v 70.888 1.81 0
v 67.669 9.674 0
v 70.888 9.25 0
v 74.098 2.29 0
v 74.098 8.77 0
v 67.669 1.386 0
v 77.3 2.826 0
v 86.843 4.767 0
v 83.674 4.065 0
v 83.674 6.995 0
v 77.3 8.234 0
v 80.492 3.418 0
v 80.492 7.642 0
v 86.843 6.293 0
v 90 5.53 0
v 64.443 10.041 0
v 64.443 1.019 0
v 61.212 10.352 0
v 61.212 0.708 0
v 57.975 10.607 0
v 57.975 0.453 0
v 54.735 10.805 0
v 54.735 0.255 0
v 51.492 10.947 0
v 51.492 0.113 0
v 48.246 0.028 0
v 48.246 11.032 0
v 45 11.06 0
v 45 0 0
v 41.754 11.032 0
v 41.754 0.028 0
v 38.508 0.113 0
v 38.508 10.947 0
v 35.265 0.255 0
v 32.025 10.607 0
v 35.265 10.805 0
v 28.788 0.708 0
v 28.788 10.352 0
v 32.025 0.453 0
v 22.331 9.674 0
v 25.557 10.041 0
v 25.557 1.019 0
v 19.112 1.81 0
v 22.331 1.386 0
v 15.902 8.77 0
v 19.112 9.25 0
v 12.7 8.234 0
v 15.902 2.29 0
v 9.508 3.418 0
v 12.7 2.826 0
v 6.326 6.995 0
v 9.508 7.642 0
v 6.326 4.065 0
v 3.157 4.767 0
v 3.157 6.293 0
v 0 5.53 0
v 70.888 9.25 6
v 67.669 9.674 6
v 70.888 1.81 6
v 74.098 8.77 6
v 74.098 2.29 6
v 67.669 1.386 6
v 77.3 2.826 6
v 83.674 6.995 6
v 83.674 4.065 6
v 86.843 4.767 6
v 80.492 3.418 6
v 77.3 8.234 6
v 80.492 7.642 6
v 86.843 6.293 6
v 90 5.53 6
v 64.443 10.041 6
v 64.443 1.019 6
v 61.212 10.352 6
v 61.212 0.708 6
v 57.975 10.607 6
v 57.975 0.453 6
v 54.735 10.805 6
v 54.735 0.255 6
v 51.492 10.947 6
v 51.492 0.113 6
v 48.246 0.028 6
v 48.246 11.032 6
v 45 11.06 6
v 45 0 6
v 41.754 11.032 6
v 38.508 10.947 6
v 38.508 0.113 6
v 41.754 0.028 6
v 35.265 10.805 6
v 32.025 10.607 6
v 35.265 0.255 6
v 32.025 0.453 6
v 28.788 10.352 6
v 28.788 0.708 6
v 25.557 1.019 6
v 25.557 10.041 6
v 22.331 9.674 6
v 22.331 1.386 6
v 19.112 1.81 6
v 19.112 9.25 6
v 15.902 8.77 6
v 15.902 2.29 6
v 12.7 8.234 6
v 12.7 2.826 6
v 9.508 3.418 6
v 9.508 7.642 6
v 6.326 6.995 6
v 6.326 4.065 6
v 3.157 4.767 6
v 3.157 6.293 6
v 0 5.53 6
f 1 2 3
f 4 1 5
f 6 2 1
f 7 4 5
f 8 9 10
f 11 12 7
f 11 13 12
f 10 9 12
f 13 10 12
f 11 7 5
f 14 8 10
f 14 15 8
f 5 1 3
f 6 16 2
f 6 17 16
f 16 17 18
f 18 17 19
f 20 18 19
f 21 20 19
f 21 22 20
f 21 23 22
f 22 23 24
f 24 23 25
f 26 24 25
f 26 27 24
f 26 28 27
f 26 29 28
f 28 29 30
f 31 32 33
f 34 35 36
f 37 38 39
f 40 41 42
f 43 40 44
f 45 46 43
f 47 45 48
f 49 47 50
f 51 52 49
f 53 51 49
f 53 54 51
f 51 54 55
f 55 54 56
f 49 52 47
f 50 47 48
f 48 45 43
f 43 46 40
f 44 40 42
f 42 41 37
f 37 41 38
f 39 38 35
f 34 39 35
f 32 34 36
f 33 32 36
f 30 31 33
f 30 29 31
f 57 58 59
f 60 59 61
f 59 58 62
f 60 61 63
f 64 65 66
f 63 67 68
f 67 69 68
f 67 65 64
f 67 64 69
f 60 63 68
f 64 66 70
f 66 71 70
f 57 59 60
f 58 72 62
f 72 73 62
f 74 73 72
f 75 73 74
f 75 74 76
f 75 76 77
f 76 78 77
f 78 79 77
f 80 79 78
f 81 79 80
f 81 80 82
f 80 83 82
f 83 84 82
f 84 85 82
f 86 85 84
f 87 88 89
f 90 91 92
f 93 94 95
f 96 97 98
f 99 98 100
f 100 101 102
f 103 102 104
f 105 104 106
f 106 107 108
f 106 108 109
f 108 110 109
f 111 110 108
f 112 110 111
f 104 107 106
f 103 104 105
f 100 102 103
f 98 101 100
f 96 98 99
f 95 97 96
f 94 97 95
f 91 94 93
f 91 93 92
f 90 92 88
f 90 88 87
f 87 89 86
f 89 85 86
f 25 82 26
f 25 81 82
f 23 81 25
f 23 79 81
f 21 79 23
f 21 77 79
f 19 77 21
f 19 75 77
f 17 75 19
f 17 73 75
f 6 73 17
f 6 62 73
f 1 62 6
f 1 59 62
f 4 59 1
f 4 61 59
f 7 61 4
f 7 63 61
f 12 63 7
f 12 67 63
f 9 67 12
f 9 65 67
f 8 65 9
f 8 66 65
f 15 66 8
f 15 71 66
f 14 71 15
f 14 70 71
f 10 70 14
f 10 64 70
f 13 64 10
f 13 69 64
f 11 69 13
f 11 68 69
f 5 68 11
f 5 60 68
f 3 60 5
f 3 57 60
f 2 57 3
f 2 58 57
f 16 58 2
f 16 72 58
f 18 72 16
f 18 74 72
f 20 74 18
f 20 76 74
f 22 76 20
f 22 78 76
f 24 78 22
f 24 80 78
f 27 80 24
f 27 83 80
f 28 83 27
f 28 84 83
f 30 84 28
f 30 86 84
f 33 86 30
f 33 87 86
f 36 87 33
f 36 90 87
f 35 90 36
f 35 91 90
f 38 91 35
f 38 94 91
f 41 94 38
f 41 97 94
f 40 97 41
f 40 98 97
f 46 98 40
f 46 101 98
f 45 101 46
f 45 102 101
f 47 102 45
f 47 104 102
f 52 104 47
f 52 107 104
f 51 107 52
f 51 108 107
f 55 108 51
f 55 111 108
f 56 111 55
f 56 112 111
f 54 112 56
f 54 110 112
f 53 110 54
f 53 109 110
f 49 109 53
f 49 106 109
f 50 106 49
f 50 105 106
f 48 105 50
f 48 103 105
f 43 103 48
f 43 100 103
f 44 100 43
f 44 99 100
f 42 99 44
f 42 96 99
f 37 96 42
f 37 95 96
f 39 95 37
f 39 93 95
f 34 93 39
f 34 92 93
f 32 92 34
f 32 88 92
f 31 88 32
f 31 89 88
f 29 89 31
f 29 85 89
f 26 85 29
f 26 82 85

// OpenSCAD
$fn = 32;

// ----------------------------------------------------------------------
// Arc profile plate: lens, 56 points
// ----------------------------------------------------------------------

// --- parameters (mm) ---
lens_chord = 90;          // chord length of the lens, X
arc_r = 186.01;           // radius of both arcs
arc_angle = 28;           // angle of each arc, degrees
sagitta = 5.53;           // bulge of each arc (half the lens height)
arc_step = 1;             // sampling step of the arcs, degrees
plate_t = 6;              // plate thickness, Z

bbox_y = 2 * sagitta;  // full lens height

profile = [[90, 5.53], [86.843, 6.293], [83.674, 6.995], [80.492, 7.642], [77.3, 8.234], [74.098, 8.77], [70.888, 9.25], [67.669, 9.674], [64.443, 10.041], [61.212, 10.352], [57.975, 10.607], [54.735, 10.805], [51.492, 10.947], [48.246, 11.032], [45, 11.06], [41.754, 11.032], [38.508, 10.947], [35.265, 10.805], [32.025, 10.607], [28.788, 10.352], [25.557, 10.041], [22.331, 9.674], [19.112, 9.25], [15.902, 8.77], [12.7, 8.234], [9.508, 7.642], [6.326, 6.995], [3.157, 6.293], [0, 5.53], [3.157, 4.767], [6.326, 4.065], [9.508, 3.418], [12.7, 2.826], [15.902, 2.29], [19.112, 1.81], [22.331, 1.386], [25.557, 1.019], [28.788, 0.708], [32.025, 0.453], [35.265, 0.255], [38.508, 0.113], [41.754, 0.028], [45, 0], [48.246, 0.028], [51.492, 0.113], [54.735, 0.255], [57.975, 0.453], [61.212, 0.708], [64.443, 1.019], [67.669, 1.386], [70.888, 1.81], [74.098, 2.29], [77.3, 2.826], [80.492, 3.418], [83.674, 4.065], [86.843, 4.767]];  // primary outline, 56 points, counter clockwise

// --- the one profile operation ---
linear_extrude(height = plate_t) polygon(points = profile);
